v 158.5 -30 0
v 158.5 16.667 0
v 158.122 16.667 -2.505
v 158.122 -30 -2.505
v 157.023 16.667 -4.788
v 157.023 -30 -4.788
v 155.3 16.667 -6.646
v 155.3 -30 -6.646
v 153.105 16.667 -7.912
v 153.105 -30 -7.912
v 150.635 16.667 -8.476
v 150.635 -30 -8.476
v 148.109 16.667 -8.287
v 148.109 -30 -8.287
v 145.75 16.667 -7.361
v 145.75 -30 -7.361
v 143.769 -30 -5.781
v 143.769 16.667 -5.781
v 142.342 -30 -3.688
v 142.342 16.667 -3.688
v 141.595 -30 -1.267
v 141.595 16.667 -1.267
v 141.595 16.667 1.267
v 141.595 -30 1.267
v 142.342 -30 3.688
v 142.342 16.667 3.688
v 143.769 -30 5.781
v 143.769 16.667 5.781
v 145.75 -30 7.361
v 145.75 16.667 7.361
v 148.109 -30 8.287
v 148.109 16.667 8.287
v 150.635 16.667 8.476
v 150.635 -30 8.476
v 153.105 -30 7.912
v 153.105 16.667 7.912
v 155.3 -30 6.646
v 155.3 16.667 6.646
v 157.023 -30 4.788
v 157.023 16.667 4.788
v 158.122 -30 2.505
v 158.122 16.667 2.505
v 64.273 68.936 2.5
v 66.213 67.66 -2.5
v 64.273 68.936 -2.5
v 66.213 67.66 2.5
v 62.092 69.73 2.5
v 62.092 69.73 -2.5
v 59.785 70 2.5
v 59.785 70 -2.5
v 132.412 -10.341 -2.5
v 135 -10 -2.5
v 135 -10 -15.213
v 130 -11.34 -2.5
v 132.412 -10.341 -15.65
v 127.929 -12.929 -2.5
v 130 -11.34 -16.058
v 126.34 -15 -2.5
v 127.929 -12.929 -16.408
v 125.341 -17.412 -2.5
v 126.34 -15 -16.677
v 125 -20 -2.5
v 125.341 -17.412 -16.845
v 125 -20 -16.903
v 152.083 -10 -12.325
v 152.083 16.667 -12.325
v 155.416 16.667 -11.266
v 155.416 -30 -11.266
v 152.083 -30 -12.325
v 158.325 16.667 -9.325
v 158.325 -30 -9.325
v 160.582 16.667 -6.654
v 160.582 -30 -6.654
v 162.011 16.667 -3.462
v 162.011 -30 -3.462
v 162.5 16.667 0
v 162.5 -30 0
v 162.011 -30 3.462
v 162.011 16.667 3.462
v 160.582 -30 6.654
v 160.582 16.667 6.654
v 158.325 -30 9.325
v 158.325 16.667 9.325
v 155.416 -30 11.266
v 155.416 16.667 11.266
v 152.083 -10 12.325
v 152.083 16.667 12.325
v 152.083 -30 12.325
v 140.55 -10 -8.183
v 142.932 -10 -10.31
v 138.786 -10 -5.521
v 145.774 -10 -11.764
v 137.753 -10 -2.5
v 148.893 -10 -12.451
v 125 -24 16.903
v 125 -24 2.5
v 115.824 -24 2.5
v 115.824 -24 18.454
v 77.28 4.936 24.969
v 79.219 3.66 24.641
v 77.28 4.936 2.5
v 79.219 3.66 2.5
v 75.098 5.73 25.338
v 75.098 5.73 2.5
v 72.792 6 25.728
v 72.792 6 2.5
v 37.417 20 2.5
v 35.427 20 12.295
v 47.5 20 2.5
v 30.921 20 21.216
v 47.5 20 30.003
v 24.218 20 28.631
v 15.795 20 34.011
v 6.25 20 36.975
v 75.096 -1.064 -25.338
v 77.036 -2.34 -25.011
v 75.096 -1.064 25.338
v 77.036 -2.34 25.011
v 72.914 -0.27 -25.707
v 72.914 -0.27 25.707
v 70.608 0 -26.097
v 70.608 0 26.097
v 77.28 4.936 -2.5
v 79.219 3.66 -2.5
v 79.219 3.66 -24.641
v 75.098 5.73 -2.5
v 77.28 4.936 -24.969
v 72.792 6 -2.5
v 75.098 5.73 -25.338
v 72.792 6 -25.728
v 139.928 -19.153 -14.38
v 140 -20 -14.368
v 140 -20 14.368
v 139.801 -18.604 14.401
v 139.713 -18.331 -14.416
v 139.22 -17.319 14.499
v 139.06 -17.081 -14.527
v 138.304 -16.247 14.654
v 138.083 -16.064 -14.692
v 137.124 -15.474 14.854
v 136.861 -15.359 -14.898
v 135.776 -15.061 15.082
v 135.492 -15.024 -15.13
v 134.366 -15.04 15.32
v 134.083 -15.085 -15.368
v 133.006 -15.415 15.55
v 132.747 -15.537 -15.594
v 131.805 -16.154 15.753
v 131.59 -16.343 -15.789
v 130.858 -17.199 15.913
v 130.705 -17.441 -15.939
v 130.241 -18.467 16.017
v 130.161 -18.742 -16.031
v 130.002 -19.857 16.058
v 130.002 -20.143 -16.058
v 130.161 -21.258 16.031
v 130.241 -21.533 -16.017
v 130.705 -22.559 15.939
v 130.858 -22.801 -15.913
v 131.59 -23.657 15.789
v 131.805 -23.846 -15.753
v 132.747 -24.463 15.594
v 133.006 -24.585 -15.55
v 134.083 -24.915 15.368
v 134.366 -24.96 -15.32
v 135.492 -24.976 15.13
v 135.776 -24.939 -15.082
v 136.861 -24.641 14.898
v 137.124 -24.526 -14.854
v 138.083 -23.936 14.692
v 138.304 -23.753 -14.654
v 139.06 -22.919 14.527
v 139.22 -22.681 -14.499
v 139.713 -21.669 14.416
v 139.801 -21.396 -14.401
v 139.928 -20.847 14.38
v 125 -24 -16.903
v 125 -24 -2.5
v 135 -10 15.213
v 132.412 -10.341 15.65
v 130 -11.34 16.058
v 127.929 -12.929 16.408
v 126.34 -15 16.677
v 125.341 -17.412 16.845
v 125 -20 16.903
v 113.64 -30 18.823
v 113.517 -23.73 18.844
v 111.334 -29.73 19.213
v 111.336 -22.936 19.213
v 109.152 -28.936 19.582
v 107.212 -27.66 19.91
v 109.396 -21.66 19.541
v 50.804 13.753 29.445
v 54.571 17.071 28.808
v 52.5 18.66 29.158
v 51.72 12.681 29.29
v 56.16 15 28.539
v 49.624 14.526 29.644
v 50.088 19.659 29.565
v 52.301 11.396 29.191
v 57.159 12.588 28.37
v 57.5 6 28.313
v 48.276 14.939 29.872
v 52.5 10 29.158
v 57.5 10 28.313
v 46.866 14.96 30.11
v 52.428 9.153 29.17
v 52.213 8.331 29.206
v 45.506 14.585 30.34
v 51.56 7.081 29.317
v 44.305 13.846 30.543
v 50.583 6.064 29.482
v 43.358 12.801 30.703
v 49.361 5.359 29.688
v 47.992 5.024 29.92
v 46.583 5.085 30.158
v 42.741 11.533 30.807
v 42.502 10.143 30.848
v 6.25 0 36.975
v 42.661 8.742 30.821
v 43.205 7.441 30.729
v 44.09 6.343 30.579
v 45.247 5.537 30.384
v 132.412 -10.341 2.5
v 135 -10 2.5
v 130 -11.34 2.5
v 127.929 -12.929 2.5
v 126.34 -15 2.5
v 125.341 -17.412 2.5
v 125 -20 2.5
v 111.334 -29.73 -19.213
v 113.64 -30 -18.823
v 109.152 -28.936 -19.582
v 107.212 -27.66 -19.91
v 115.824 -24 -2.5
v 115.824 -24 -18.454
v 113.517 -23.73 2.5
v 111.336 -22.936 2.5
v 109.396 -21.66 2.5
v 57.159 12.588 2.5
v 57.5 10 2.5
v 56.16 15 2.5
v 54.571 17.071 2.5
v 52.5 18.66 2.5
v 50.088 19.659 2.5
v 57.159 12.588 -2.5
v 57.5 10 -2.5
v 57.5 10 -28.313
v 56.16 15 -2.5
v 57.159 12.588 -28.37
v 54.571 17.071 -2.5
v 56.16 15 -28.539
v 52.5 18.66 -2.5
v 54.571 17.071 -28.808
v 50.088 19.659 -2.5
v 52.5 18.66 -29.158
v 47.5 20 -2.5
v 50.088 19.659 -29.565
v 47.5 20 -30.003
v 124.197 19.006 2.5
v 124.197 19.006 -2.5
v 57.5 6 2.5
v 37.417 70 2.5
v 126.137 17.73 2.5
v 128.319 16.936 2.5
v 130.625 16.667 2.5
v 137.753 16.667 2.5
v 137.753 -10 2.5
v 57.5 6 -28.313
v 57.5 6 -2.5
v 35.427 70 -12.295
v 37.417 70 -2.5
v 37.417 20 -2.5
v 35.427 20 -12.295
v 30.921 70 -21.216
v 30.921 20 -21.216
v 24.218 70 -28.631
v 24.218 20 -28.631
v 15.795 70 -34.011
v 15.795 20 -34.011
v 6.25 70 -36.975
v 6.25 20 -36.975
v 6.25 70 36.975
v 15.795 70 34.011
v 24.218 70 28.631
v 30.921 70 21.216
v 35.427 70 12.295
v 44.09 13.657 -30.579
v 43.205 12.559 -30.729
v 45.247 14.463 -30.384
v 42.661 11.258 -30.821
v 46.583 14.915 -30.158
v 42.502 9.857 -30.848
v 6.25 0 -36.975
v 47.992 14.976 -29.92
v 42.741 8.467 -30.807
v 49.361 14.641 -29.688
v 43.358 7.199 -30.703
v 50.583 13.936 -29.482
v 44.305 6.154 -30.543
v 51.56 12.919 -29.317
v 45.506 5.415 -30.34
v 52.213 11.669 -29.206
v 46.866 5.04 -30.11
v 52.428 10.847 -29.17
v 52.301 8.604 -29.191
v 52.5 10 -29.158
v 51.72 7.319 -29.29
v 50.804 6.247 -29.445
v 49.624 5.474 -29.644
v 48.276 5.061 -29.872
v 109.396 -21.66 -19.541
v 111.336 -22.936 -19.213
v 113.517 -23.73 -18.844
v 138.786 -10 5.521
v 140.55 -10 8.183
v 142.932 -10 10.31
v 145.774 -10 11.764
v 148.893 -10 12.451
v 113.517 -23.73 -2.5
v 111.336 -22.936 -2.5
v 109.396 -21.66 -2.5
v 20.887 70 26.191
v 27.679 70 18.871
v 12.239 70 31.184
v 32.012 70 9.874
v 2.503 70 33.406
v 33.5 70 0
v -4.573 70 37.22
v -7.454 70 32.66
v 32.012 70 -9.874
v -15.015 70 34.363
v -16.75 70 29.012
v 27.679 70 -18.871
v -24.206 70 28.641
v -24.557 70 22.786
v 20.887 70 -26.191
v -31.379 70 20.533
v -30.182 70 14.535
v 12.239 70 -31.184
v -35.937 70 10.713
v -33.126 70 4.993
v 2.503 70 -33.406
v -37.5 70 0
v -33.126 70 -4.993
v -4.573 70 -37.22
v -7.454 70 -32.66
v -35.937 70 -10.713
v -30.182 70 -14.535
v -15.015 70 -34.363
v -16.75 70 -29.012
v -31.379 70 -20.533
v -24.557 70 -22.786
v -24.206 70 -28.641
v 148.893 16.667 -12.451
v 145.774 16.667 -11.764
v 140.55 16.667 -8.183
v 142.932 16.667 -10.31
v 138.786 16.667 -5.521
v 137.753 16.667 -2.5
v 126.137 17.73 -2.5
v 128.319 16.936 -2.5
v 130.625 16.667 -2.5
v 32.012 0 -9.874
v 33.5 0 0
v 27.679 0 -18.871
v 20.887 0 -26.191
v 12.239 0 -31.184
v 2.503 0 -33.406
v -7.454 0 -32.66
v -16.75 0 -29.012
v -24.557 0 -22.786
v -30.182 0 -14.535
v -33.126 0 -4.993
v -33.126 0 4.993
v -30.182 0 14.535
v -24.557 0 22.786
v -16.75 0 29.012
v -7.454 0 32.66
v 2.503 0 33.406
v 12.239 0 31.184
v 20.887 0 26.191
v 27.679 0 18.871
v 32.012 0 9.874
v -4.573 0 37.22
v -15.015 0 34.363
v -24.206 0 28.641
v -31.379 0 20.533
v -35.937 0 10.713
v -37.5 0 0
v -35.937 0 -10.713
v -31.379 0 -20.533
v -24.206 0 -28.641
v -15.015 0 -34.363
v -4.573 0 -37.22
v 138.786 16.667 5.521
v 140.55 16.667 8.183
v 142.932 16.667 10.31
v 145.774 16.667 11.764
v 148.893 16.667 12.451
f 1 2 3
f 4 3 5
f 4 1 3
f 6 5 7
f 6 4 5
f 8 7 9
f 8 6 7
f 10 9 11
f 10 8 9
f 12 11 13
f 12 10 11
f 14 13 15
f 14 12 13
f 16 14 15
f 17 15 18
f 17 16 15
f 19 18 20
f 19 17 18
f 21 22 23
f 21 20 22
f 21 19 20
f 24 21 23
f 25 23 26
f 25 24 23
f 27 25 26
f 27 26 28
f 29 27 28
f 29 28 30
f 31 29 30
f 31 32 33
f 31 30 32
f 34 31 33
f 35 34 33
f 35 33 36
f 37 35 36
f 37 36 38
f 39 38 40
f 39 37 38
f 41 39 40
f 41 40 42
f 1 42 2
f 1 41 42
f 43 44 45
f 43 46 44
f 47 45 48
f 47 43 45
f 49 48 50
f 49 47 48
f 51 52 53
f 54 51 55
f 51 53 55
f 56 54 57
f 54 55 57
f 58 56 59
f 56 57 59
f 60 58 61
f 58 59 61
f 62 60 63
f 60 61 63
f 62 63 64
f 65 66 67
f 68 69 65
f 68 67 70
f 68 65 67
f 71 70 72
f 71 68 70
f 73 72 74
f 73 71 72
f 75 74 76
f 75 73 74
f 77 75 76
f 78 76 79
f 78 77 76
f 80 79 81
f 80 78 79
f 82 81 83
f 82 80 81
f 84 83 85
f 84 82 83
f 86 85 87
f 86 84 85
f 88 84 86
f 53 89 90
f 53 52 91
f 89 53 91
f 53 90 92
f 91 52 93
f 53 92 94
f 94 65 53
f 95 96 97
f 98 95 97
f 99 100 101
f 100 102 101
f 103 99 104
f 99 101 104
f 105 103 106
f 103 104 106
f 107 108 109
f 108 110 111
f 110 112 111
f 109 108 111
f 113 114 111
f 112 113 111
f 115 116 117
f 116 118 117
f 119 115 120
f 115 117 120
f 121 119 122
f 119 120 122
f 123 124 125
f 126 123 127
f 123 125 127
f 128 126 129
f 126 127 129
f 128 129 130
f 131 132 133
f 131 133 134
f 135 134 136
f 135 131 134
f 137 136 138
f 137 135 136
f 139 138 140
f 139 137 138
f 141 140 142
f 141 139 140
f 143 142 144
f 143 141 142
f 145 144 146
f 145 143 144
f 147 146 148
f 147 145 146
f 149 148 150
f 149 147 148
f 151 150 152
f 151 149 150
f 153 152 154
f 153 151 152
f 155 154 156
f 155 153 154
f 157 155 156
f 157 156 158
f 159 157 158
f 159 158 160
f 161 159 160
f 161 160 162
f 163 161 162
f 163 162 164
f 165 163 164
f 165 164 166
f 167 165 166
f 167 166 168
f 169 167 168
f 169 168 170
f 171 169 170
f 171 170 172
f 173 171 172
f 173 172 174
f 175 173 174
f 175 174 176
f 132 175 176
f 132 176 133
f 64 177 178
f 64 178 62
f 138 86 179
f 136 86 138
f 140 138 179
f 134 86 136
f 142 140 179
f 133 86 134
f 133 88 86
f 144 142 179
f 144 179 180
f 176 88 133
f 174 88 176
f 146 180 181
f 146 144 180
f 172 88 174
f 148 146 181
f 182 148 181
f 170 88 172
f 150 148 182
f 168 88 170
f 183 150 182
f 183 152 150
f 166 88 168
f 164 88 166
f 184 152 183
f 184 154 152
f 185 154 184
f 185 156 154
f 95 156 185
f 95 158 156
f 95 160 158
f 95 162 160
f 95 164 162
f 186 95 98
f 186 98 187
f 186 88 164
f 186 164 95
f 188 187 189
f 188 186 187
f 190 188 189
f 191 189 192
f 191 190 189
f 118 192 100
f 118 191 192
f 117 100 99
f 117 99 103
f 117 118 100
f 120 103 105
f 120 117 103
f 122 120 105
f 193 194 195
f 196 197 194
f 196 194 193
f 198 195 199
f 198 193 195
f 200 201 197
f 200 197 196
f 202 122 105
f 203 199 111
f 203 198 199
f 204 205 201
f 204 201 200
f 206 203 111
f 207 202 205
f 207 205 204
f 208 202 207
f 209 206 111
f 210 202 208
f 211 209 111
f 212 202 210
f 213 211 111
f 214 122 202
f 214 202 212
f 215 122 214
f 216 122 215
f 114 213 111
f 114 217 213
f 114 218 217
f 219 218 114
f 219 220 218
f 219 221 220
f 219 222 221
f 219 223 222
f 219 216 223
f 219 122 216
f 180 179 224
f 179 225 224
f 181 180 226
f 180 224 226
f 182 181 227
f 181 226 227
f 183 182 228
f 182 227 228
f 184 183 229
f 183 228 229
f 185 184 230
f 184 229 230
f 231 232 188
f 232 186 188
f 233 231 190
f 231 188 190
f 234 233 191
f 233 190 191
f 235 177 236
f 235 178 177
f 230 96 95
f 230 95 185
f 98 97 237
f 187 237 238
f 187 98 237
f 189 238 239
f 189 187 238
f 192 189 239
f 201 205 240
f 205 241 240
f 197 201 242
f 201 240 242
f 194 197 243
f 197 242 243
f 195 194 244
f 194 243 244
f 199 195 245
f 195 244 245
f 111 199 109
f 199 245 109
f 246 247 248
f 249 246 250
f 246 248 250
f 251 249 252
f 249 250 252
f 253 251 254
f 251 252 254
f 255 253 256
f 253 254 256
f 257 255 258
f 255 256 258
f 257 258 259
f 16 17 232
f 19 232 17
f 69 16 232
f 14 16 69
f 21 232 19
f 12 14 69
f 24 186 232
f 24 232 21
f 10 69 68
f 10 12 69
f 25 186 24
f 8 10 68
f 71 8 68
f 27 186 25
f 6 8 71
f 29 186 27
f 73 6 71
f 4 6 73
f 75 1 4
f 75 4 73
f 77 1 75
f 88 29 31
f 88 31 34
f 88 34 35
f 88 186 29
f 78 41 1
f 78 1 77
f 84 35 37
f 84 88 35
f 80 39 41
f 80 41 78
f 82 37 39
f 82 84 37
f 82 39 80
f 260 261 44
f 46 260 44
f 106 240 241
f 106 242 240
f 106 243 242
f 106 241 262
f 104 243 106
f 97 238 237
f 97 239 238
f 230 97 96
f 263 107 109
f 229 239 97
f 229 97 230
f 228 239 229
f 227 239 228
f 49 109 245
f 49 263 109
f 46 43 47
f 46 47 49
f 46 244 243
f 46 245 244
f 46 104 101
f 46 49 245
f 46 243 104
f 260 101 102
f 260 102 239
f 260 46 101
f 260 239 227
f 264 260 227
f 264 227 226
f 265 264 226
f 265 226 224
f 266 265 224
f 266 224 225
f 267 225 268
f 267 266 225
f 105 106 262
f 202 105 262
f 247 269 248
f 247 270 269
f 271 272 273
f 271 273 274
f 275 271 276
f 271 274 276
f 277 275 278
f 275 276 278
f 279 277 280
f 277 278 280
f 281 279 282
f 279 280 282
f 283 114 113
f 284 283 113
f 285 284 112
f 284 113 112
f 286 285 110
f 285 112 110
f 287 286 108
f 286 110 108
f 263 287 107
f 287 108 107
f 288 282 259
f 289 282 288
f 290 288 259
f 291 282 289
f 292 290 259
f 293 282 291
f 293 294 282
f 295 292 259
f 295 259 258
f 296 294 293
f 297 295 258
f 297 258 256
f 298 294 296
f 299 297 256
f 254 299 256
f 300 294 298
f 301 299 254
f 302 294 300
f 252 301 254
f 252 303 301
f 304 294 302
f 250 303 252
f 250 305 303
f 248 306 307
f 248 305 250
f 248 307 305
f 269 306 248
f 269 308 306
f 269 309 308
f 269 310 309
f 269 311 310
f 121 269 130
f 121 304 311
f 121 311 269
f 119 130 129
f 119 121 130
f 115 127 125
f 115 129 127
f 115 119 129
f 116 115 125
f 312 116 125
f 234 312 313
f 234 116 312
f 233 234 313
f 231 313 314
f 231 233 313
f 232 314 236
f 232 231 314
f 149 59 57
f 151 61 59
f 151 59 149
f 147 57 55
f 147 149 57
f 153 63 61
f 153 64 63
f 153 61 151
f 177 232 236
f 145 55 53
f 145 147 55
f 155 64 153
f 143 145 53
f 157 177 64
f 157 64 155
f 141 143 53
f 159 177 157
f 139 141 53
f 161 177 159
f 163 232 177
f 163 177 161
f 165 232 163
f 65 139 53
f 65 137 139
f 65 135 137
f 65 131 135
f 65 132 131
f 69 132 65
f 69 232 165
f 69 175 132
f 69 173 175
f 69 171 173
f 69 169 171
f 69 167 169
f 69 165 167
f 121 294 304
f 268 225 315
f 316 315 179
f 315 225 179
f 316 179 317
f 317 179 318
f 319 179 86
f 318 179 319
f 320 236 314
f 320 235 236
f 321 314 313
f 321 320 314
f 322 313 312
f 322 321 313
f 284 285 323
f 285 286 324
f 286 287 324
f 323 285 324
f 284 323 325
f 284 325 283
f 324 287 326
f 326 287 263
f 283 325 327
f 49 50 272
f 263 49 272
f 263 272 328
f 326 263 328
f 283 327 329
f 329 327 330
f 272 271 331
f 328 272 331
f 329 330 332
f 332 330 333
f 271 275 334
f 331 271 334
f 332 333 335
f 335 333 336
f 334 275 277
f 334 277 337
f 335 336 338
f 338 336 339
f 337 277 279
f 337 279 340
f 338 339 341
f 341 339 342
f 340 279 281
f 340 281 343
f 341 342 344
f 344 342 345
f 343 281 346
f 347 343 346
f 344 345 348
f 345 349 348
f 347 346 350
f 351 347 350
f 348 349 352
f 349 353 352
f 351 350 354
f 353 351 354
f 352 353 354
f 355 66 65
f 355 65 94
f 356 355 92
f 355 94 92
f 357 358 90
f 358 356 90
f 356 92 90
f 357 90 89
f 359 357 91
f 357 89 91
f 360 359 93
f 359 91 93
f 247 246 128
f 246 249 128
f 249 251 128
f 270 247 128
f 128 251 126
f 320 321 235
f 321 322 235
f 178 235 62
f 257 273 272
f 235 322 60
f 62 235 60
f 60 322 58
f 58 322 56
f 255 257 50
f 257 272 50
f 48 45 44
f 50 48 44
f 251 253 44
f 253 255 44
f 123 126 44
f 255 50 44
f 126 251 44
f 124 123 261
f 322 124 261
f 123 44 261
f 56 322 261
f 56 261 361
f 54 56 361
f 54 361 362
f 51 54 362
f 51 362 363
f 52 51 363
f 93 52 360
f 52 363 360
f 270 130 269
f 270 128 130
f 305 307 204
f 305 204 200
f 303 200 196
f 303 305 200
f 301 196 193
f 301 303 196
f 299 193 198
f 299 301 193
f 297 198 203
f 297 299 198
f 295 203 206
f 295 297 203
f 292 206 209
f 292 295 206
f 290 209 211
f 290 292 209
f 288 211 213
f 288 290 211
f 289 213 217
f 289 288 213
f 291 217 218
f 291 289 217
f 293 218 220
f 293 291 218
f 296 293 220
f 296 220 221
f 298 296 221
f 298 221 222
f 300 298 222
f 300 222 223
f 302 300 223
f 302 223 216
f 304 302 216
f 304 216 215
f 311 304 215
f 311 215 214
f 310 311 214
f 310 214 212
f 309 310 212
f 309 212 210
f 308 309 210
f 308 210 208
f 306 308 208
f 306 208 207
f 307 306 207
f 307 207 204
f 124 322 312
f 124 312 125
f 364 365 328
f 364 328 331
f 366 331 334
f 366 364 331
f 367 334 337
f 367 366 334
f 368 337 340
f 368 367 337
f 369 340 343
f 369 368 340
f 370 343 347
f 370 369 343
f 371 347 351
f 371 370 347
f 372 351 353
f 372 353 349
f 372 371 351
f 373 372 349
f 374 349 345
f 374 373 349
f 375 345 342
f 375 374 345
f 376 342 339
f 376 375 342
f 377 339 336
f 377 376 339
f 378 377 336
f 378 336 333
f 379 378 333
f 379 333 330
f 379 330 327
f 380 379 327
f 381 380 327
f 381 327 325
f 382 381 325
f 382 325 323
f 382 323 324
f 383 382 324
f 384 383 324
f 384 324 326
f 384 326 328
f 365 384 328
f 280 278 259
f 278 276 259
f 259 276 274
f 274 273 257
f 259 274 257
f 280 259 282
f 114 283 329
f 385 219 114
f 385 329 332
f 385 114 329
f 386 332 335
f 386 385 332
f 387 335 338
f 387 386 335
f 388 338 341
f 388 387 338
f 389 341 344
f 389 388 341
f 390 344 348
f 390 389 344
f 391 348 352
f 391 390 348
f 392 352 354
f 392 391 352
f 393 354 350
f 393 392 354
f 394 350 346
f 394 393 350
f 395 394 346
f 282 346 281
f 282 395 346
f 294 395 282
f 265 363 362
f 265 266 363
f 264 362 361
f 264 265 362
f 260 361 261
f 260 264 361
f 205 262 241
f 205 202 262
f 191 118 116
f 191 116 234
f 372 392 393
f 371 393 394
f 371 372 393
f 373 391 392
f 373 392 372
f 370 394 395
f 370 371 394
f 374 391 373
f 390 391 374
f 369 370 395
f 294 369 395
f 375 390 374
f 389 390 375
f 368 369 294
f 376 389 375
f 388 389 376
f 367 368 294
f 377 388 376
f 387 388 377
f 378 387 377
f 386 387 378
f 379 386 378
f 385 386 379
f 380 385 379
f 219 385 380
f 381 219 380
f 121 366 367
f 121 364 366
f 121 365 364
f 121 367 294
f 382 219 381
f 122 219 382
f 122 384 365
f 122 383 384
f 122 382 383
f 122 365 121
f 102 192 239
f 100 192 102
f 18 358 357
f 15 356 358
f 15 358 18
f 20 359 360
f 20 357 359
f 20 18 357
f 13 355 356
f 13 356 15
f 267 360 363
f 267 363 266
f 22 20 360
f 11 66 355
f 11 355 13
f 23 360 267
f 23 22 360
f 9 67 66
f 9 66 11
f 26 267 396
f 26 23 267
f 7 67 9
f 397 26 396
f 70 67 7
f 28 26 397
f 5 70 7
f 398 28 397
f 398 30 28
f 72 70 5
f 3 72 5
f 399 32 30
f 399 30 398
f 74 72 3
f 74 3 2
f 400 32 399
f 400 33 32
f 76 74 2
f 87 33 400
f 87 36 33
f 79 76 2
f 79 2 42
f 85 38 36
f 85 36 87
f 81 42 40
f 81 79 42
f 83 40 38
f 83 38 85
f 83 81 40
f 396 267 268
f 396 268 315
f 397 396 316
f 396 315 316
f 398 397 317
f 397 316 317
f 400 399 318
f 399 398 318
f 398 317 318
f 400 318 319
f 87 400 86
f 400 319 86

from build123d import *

# Parameters (mm, degrees)
SKETCH2_R                = 37.5
BOSS_EXTRUDE1_DEPTH      = 70
BOSS_EXTRUDE2_START      = -30
SKETCH2_3_R              = 12.5
BOSS_EXTRUDE2_DEPTH      = 46.666666667
EXTRUDE_THIN1_DEPTH      = 115
SKETCH5_W                = 100
SKETCH5_H                = 20
SKETCH5_W_2              = 50
BOSS_EXTRUDE3_DEPTH      = 230
CUT_EXTRUDE2_DEPTH       = 298.363414024
CUT_EXTRUDE2_DEPTH_BACK  = 298.363414024
SKETCH5_3_R              = 5
CUT_EXTRUDE1_START       = -30
CUT_EXTRUDE1_OUTLINE_W   = 217.5
CUT_EXTRUDE1_OUTLINE_H   = 230
CUT_EXTRUDE1_OUTLINE_R   = 8.5
CUT_EXTRUDE1_OUTLINE_R_2 = 33.5
CUT_EXTRUDE1_DEPTH       = 100
RIB1_START               = -2.5
RIB1_DEPTH               = 5
FILLET1_R                = 10


# Read off the part's stored shape, not the designer's step: Cut-Extrude1, Rib1
with BuildPart() as part:
    # Sketch2 → Boss-Extrude1 (new body)
    with BuildSketch(Plane(origin=(0, 0, 0), x_dir=(1, 0, 0), z_dir=(0, 1, 0))):
        with Locations(Location((0, 0, 0), (0, 0, 270))):
            Circle(SKETCH2_R)
    extrude(amount=BOSS_EXTRUDE1_DEPTH)



with BuildPart() as body_2:
    # Sketch2<3> → Boss-Extrude2 (new body)
    with BuildSketch(Plane(origin=(0, 0, 0), x_dir=(1, 0, 0), z_dir=(0, 1, 0)).offset(BOSS_EXTRUDE2_START)):
        with Locations(Location((150, 0, 0), (0, 0, 270))):
            Circle(SKETCH2_3_R)
    extrude(amount=BOSS_EXTRUDE2_DEPTH)


with BuildPart() as part_1:
    add(part.part)

    add(body_2.part)  # Extrude-Thin1 merges body 2
    # Sketch3 → Extrude-Thin1 (add, symmetric)
    with BuildSketch(Plane.XY):
        Polygon((-37.5, 0), (74.247392222, 0), (110, -30), (162.5, -30), (162.5, -24), (112.183821406, -24), (76.431213628, 6), (-37.5, 6), align=None)
    extrude(amount=EXTRUDE_THIN1_DEPTH, both=True)

    # Sketch5 → Boss-Extrude3 (add)
    with BuildSketch(Plane.XY.offset(115)):
        with Locations((7.5, 10)):
            Rectangle(SKETCH5_W, SKETCH5_H)
        with Locations((150, -20)):
            Rectangle(SKETCH5_W_2, SKETCH5_H)
    extrude(amount=-BOSS_EXTRUDE3_DEPTH)

    # Sketch5<3> → Cut-Extrude2 (cut, two sides: drawn at the far end of the back side and taken through both)
    with BuildSketch(Plane.XY.offset(115).offset(-CUT_EXTRUDE2_DEPTH_BACK)):
        with Locations((47.5, 10)):
            Circle(SKETCH5_3_R)
        with Locations((135, -20)):
            Circle(SKETCH5_3_R)
    extrude(amount=CUT_EXTRUDE2_DEPTH + CUT_EXTRUDE2_DEPTH_BACK, mode=Mode.SUBTRACT)

    # Cut-Extrude1 outline → Cut-Extrude1 (cut)
    # profile 1 of 3: a face of its own
    with BuildSketch(Plane(origin=(0, 0, 0), x_dir=(1, 0, 0), z_dir=(0, 1, 0)).offset(CUT_EXTRUDE1_START)):
        with Locations((66.25, 0)):
            Rectangle(CUT_EXTRUDE1_OUTLINE_W, CUT_EXTRUDE1_OUTLINE_H)
        with BuildLine():
            ThreePointArc((152.083333333, 12.325166215), (162.5, 0), (152.083333333, -12.325166215))
            Line((152.083333333, -12.325166215), (6.25, -36.975498644))
            ThreePointArc((6.25, -36.975498644), (-37.5, 0), (6.25, 36.975498644))
            Line((6.25, 36.975498644), (152.083333333, 12.325166215))
        make_face(mode=Mode.SUBTRACT)
    # profile 2 of 3: a face of its own
    with BuildSketch(Plane(origin=(0, 0, 0), x_dir=(1, 0, 0), z_dir=(0, 1, 0)).offset(CUT_EXTRUDE1_START)):
        with Locations((150, 0)):
            Circle(CUT_EXTRUDE1_OUTLINE_R)
    # profile 3 of 3: a face of its own
    with BuildSketch(Plane(origin=(0, 0, 0), x_dir=(1, 0, 0), z_dir=(0, 1, 0)).offset(CUT_EXTRUDE1_START)):
        Circle(CUT_EXTRUDE1_OUTLINE_R_2)
    extrude(amount=CUT_EXTRUDE1_DEPTH, mode=Mode.SUBTRACT)

    # Rib1 outline → Rib1 (add)
    with BuildSketch(Plane.XY.offset(RIB1_START)):
        Polygon((139, -10), (139, 16.666666667), (126.985277599, 16.666666667), (63.425085994, 70), (36, 70), (36, 20), (57.5, 20), (57.5, 6), (76.431213628, 6), (112.183821406, -24), (125, -24), (125, -10), align=None)
    extrude(amount=RIB1_DEPTH)

    # Fillet1
    fillet1_edges = [part_1.edges().sort_by_distance(p)[0] for p in [
        (76.431213628, 6, 13.806354192),
        (112.183821406, -24, 10.784707334),
        (110, -30, 0),
        (112.183821406, -24, -10.784707334),
        (125, -10, 9.701542547),
        (76.431213628, 6, -13.806354192),
        (57.5, 20, 15.406333767),
        (126.985277599, 16.666666667, 0),
        (63.425085994, 70, 0),
        (125, -10, -9.701542547),
        (57.5, 20, -15.406333767),
        (74.247392222, 0, 0),
    ]]
    fillet(fillet1_edges, radius=FILLET1_R)


solid = part_1.part
